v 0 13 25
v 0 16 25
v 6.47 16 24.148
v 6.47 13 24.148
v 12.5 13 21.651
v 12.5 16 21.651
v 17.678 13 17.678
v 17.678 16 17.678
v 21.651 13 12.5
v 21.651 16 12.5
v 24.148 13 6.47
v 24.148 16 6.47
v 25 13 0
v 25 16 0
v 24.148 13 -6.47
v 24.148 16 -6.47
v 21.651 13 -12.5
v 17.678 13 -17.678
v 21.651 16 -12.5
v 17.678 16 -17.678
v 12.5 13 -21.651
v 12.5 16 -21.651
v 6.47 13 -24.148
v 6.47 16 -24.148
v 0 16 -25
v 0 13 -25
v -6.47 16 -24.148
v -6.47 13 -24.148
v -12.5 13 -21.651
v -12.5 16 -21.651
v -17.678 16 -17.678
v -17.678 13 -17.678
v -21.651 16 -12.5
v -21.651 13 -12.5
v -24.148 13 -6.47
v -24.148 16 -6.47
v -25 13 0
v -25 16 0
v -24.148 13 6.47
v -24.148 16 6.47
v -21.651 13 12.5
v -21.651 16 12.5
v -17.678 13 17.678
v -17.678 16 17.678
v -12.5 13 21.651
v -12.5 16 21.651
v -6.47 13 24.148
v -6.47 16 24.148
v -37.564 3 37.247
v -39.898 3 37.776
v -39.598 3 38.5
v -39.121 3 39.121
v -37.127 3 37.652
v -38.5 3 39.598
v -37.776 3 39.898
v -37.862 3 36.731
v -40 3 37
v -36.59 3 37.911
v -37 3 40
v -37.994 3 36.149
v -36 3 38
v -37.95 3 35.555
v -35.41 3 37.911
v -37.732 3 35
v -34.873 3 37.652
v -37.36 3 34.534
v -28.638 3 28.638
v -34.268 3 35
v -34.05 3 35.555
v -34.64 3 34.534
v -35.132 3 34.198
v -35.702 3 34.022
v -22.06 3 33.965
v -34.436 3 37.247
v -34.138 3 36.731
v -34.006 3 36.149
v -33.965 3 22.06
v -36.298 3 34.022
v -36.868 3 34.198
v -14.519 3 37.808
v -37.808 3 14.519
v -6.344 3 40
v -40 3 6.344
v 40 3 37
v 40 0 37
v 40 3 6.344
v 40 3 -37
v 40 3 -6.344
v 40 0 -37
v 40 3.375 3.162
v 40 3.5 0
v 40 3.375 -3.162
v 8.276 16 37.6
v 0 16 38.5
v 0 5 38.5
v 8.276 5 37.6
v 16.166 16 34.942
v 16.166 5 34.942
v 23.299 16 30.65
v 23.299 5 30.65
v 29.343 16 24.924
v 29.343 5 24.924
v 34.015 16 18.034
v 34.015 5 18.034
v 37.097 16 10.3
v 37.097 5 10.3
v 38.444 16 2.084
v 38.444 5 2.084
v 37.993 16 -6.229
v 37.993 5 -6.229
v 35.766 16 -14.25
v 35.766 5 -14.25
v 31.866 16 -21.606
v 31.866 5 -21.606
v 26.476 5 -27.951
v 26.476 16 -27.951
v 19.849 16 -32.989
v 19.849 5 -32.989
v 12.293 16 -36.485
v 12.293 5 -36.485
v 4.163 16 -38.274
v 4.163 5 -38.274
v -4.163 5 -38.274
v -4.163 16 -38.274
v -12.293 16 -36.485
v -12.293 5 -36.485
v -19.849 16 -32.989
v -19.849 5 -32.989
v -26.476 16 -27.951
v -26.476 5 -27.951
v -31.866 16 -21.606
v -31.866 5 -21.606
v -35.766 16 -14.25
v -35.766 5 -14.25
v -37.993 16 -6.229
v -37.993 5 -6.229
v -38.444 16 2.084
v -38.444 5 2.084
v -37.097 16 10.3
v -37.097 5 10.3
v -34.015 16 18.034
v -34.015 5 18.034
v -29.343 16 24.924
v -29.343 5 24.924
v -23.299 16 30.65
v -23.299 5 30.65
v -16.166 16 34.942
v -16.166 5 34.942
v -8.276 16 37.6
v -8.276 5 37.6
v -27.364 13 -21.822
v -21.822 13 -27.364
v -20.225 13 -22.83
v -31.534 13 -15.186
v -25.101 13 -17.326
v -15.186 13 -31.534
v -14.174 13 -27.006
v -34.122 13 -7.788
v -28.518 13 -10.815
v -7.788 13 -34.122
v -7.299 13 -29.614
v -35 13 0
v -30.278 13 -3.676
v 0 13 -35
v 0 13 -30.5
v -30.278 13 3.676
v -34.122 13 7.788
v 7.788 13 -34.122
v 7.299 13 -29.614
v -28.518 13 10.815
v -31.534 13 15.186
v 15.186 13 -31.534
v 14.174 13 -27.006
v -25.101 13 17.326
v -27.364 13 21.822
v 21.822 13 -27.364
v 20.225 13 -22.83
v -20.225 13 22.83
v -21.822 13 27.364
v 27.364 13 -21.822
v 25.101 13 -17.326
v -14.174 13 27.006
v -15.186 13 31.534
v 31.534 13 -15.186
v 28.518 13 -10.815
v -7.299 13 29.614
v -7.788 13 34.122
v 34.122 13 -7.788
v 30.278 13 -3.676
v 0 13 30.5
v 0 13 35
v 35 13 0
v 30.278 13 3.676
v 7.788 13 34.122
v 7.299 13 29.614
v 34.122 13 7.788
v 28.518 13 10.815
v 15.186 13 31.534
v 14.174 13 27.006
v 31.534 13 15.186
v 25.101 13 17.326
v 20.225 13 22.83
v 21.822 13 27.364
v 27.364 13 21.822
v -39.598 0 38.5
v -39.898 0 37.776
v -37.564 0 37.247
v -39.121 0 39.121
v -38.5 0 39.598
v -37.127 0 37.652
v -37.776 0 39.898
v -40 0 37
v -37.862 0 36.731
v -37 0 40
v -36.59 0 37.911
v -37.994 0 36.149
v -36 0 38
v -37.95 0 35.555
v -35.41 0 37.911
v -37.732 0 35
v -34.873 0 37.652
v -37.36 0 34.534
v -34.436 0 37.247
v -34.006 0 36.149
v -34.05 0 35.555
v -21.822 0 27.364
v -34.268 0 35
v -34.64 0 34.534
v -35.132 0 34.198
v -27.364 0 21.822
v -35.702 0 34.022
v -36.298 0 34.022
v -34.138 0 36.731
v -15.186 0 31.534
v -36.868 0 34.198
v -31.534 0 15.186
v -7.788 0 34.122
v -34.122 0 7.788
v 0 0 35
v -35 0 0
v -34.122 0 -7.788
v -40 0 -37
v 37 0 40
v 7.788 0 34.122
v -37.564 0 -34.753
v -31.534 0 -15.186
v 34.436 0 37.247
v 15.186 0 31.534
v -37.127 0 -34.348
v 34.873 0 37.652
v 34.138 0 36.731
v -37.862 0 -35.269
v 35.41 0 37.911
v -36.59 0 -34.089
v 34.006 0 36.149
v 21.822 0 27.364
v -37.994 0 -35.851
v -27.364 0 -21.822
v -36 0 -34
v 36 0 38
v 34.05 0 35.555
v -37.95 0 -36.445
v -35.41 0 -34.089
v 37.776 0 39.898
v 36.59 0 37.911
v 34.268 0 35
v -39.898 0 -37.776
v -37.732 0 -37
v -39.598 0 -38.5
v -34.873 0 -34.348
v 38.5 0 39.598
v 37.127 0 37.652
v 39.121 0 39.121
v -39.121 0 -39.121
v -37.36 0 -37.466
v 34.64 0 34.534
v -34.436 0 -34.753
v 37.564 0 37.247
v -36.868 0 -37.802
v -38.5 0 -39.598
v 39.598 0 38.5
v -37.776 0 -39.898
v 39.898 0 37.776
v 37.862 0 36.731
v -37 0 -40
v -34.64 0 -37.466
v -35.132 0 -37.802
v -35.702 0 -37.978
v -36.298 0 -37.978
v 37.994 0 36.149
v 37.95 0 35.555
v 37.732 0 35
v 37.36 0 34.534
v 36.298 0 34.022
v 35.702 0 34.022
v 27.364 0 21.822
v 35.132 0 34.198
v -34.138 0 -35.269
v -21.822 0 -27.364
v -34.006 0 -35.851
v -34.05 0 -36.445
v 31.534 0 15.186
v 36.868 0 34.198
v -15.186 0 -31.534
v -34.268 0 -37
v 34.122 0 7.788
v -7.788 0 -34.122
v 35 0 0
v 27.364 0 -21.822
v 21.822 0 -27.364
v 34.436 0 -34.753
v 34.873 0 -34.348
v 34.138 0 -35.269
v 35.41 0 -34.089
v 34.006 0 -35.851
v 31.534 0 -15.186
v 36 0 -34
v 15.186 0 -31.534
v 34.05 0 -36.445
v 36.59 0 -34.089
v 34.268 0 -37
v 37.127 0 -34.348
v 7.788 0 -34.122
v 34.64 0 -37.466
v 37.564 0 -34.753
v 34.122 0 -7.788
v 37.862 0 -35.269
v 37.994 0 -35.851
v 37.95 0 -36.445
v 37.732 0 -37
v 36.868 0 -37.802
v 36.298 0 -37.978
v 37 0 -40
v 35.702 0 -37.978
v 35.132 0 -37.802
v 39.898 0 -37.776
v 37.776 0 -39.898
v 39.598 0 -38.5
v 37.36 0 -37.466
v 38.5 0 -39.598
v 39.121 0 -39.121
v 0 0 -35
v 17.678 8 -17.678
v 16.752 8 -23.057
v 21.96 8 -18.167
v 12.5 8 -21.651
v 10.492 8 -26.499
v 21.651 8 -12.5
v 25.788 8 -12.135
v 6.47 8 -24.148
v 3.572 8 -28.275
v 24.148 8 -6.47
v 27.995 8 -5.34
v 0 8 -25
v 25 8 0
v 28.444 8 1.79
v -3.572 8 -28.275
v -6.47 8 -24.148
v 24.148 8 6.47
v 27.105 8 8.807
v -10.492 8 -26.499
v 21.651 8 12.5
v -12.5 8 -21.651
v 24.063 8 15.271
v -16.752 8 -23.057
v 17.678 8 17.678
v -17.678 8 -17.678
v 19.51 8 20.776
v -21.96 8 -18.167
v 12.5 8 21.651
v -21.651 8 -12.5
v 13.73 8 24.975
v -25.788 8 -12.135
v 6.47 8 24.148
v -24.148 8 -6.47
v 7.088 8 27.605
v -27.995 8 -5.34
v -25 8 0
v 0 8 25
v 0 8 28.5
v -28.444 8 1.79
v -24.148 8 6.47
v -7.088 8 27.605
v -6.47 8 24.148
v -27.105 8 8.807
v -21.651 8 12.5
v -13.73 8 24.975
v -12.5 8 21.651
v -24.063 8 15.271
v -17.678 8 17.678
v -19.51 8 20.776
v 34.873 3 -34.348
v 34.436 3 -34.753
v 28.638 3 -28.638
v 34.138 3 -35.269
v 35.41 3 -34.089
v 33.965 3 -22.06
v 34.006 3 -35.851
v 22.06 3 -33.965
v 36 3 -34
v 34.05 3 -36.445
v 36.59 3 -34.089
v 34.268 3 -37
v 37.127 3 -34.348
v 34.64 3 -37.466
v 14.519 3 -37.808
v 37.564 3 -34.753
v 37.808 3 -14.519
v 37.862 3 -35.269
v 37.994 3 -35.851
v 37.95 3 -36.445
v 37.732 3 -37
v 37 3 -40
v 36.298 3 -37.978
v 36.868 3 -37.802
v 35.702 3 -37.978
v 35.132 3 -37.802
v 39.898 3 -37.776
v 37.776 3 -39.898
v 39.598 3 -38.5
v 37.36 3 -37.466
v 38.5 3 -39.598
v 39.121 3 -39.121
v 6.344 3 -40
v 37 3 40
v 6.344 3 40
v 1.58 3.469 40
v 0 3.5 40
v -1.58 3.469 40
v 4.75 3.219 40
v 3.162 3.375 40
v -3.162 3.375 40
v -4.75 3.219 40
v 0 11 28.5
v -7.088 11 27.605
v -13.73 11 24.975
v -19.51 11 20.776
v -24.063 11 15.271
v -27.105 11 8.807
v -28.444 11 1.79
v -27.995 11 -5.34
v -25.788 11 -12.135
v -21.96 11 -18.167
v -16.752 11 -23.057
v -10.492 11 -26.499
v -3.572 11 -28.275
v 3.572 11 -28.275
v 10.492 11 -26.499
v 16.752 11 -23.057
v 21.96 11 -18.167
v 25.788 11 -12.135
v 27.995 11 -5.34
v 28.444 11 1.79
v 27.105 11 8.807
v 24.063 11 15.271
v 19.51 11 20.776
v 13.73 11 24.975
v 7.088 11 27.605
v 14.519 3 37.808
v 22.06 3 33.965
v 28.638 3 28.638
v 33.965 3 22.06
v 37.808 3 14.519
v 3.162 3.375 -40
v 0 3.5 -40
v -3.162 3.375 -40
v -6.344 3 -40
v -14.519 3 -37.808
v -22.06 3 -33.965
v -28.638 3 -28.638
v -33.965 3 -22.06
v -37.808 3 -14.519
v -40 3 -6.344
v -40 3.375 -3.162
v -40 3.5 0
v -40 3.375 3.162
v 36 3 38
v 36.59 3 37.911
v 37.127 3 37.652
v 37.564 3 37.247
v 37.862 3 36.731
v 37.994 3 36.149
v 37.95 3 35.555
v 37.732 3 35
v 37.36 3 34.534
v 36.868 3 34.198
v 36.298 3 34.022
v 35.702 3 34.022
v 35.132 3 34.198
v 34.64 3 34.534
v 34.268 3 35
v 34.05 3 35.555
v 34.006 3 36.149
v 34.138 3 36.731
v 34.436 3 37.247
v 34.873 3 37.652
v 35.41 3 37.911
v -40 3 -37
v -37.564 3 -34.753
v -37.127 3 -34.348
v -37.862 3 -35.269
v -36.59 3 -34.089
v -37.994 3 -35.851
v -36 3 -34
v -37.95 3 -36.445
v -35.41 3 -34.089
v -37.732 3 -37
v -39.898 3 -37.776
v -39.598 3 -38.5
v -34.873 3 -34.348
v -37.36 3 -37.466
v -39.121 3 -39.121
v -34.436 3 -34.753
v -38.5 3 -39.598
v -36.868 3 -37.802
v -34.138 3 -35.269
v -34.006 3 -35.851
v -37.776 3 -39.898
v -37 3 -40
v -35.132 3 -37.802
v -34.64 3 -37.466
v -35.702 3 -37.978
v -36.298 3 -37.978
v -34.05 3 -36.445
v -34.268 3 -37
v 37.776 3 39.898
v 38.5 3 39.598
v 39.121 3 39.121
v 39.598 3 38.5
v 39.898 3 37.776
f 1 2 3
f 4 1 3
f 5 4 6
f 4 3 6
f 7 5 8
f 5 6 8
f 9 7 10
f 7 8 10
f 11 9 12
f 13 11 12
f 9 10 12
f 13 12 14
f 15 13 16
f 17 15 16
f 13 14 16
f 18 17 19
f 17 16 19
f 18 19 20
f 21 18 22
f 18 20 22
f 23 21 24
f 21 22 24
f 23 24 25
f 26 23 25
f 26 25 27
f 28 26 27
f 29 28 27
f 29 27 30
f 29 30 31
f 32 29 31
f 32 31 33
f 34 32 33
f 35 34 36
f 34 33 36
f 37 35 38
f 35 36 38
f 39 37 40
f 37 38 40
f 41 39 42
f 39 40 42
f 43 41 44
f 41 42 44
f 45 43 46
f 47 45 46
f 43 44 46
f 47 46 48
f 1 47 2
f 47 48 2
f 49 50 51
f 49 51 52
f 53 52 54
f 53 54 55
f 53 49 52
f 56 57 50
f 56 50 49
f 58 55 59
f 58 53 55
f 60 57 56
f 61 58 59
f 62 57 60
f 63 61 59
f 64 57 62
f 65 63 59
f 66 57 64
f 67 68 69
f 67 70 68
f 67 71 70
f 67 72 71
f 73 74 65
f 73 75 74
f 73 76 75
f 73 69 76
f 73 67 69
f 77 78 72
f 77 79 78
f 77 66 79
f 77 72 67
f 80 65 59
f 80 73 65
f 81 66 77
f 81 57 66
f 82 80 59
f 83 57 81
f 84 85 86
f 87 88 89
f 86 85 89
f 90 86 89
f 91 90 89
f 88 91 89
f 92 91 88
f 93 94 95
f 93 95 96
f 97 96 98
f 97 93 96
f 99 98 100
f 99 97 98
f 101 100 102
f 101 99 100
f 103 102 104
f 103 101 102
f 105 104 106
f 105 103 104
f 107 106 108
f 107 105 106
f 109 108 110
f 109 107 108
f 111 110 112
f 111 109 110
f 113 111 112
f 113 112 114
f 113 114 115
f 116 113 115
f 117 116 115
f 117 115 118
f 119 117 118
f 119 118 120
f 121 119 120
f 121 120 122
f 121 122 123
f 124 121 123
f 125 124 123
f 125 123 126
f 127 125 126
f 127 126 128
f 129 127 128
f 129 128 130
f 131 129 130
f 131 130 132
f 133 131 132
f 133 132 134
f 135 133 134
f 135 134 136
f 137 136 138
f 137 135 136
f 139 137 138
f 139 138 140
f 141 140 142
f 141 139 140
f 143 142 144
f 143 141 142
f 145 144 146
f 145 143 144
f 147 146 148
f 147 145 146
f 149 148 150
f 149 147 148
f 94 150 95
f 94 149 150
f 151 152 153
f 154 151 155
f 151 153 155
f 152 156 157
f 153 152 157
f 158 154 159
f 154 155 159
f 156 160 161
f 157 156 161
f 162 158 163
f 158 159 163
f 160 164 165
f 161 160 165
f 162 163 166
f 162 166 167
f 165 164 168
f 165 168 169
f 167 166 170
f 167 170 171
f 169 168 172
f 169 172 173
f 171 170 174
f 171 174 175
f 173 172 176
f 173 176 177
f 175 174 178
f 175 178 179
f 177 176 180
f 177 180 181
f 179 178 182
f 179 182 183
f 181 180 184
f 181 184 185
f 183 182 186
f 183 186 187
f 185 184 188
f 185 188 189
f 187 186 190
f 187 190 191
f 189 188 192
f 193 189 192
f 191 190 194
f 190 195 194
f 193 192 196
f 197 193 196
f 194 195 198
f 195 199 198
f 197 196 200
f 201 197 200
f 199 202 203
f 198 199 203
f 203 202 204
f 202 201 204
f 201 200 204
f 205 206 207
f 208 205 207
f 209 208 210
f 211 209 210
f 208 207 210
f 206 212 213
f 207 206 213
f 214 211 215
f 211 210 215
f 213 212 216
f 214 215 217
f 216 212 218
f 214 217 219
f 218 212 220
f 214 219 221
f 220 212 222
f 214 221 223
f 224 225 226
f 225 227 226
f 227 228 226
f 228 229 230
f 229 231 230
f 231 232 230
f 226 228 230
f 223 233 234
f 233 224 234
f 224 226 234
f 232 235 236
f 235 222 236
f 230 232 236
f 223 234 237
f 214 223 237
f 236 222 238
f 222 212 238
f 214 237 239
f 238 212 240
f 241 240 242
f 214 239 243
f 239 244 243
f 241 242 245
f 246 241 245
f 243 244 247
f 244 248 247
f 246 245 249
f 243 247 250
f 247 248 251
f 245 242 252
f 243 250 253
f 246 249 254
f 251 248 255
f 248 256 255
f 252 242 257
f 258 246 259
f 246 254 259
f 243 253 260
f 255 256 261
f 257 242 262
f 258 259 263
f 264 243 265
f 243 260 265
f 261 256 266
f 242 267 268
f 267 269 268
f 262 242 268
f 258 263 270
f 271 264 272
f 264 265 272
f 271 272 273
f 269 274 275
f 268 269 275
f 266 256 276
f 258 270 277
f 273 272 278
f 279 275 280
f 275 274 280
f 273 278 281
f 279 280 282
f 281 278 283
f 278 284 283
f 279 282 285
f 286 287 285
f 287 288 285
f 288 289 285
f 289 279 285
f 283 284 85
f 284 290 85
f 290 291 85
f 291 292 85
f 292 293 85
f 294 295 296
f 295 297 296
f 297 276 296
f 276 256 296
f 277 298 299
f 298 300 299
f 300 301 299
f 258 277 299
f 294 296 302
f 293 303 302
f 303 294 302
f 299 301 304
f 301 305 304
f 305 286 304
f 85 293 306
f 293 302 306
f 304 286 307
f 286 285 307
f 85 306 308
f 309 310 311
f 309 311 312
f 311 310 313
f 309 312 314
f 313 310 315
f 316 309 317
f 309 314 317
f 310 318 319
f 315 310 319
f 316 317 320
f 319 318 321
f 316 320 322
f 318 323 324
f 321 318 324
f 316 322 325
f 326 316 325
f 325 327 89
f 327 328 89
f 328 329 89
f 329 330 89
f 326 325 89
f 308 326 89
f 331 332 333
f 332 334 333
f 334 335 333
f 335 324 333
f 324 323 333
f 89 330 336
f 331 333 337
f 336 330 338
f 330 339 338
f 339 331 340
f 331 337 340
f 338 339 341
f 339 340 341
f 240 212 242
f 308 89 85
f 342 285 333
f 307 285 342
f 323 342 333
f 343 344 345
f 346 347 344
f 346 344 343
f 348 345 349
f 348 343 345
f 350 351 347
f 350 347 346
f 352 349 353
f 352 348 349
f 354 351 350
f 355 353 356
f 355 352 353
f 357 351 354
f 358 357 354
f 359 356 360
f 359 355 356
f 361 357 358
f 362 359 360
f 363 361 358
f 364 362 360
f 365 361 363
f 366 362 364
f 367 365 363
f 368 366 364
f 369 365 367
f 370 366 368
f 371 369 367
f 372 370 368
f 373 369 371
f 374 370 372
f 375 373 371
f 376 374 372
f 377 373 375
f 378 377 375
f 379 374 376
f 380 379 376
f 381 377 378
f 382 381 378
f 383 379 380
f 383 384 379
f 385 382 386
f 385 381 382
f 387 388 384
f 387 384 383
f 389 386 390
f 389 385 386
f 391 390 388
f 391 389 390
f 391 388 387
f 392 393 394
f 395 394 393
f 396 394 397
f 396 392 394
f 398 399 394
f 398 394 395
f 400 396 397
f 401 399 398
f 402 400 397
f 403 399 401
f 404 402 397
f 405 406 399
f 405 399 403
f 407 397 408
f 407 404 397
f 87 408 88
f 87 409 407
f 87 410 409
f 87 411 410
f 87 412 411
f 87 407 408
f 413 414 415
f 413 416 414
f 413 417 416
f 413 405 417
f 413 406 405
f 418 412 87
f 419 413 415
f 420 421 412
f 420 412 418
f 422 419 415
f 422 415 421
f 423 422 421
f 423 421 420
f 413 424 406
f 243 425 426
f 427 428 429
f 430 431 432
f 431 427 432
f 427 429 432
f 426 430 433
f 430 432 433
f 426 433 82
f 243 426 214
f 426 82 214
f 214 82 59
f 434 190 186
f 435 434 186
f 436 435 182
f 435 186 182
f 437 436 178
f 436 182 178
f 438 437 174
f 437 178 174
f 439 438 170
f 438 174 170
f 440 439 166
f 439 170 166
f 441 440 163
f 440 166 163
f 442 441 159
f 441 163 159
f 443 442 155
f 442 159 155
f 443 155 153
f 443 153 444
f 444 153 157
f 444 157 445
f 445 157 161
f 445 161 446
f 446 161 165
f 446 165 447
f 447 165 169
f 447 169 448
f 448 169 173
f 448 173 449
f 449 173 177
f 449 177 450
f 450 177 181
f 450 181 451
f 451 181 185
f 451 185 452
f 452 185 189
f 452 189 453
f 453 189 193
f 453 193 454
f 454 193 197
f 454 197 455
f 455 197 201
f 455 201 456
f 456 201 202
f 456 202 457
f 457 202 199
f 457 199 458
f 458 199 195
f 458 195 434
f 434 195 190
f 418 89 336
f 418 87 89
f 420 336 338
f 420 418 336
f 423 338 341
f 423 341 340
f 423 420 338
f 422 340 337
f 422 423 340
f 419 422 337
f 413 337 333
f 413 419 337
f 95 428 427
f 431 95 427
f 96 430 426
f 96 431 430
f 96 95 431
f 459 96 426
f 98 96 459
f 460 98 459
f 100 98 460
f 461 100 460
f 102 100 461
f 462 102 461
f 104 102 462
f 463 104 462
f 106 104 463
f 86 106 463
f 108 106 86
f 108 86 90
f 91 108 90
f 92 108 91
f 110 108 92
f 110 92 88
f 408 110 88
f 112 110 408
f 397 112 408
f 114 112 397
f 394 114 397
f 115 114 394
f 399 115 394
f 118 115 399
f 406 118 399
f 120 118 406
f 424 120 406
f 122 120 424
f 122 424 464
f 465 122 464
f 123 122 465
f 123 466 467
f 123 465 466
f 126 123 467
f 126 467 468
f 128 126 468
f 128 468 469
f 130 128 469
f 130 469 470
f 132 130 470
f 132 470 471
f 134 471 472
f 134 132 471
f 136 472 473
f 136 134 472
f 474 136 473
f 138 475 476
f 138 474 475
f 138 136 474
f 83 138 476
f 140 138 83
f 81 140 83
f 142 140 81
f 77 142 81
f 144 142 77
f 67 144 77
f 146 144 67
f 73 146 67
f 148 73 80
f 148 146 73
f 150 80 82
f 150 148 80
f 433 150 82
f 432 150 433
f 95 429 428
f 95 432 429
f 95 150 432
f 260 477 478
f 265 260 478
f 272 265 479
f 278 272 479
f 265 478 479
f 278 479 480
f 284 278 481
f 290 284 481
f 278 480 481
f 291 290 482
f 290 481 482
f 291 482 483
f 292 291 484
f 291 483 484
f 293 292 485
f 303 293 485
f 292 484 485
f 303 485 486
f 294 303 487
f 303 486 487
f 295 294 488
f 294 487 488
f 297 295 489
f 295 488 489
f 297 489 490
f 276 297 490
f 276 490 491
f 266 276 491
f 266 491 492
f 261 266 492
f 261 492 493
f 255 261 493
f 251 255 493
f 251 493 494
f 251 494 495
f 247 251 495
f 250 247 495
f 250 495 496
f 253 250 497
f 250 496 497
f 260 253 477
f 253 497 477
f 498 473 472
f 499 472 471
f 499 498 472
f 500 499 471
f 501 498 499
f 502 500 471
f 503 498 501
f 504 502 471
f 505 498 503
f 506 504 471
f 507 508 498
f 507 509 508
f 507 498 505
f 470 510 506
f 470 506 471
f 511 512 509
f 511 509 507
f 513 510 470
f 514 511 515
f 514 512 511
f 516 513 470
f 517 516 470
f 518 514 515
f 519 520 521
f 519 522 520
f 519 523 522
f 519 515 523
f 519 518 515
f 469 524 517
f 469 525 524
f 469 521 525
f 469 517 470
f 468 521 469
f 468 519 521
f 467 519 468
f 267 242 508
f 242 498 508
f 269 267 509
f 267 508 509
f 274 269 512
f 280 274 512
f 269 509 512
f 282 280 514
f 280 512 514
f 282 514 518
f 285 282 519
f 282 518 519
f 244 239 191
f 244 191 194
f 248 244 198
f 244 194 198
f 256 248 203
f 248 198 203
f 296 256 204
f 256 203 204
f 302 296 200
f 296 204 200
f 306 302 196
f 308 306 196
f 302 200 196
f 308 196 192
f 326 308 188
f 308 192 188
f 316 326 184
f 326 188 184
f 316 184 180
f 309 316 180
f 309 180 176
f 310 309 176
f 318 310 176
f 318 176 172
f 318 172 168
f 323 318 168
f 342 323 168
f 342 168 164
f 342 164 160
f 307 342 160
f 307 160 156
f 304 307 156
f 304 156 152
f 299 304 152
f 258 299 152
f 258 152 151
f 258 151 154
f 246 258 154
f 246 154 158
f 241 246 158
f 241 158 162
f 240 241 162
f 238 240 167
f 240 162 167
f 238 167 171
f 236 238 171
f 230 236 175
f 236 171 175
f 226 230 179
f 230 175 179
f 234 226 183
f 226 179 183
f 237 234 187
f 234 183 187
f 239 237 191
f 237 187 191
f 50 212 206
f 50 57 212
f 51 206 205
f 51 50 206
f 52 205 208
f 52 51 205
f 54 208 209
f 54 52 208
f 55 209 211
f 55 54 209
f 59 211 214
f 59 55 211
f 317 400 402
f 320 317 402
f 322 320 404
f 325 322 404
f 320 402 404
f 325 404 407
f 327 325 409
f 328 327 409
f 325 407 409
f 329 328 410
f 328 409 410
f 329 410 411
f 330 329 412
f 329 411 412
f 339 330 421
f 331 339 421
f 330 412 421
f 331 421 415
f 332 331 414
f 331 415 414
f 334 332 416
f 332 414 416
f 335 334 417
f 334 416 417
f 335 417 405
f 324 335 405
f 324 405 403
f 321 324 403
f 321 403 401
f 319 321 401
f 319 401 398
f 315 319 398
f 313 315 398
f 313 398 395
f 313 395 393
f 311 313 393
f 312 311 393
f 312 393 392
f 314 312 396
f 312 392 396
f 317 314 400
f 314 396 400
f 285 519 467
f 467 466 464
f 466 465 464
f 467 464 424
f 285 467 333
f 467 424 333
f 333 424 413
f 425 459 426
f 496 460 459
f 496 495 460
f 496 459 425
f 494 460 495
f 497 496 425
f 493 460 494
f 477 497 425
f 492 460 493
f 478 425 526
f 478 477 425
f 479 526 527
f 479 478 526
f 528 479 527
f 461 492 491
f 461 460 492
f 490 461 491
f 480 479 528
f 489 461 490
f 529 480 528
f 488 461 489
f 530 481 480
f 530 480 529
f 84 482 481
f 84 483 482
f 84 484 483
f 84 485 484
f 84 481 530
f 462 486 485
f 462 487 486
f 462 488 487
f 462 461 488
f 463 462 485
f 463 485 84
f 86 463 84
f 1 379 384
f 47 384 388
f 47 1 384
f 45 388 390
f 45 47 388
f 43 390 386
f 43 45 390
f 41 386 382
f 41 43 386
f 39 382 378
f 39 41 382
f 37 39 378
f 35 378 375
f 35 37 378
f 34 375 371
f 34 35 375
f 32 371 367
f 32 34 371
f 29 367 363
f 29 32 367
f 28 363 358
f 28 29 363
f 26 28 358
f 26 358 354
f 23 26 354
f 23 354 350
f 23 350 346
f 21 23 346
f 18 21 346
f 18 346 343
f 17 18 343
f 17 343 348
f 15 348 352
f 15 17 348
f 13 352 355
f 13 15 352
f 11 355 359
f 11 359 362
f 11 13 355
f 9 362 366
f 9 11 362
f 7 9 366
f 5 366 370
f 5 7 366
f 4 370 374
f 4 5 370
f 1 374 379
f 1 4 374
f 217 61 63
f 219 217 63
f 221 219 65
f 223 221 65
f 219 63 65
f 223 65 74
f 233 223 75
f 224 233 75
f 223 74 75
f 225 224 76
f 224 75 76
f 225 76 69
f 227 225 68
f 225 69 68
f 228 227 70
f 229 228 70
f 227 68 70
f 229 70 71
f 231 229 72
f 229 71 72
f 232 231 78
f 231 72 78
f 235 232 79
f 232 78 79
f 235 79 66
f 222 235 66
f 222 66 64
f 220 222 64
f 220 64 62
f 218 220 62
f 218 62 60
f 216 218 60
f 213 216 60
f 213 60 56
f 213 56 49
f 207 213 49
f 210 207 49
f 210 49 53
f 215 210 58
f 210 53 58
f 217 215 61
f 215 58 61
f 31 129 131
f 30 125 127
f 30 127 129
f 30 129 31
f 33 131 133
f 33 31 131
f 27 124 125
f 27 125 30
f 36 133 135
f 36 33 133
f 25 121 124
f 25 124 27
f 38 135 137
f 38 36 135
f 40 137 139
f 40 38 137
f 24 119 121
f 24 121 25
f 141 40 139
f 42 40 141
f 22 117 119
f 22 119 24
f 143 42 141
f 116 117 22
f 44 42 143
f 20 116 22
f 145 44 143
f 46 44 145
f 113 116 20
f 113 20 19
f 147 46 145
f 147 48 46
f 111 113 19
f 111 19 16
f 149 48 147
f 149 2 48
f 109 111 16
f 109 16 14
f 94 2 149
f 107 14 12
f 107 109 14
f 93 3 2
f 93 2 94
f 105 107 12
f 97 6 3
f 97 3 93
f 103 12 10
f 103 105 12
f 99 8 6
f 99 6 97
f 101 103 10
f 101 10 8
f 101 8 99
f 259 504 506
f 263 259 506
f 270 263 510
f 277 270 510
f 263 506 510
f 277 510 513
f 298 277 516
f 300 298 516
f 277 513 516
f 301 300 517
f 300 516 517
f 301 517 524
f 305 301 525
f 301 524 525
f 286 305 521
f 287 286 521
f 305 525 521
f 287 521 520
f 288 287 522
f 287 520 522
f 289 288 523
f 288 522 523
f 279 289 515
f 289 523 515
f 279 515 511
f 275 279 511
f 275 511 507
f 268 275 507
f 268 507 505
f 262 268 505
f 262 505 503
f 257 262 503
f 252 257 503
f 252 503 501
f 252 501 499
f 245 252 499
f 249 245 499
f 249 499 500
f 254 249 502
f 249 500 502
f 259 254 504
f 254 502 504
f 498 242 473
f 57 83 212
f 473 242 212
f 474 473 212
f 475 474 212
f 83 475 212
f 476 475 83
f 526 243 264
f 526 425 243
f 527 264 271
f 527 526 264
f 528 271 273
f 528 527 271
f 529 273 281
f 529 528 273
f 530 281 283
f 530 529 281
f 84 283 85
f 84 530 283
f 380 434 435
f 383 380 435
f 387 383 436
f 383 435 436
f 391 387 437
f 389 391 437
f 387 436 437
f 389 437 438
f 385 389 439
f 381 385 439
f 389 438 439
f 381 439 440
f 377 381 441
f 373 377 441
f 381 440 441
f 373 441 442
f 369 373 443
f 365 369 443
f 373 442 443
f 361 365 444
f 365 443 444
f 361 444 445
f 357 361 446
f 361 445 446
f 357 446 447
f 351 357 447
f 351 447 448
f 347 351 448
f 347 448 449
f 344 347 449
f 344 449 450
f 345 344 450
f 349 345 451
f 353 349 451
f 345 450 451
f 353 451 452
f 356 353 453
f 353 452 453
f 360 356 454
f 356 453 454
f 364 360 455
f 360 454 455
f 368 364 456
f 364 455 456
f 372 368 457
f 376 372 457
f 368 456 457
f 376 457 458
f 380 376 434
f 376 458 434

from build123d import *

# Parameters (mm, degrees)
SKETCH1_W           = 80
SKETCH1_H           = 80
BOSS_EXTRUDE1_DEPTH = 3
FILLET1_R           = 3
SKETCH2_R           = 2
CUT_EXTRUDE1_DEPTH  = 3
SKETCH3_R           = 35
CUT_EXTRUDE2_DEPTH  = 3
BOSS_EXTRUDE2_START = 10
SKETCH4_R           = 38.5
SKETCH4_R_2         = 35
BOSS_EXTRUDE2_DEPTH = 10
BOSS_EXTRUDE3_START = 3
SKETCH5_R           = 38.5
BOSS_EXTRUDE3_DEPTH = 3
SKETCH6_R           = 25
CUT_EXTRUDE3_DEPTH  = 3
SKETCH7_R           = 28.5
SKETCH7_R_2         = 25
BOSS_EXTRUDE4_DEPTH = 5
CHAMFER1_SIZE       = 2
CHAMFER2_SIZE       = 2


with BuildPart() as part:
    # Sketch1 → Boss-Extrude1 (new body)
    with BuildSketch(Plane(origin=(0, 0, 0), x_dir=(1, 0, 0), z_dir=(0, 1, 0))):
        Rectangle(SKETCH1_W, SKETCH1_H)
    extrude(amount=BOSS_EXTRUDE1_DEPTH)

    # Fillet1
    fillet1_edges = [part.edges().sort_by_distance(p)[0] for p in [
        (40, 1.5, 40),
        (-40, 1.5, 40),
        (-40, 1.5, -40),
        (40, 1.5, -40),
    ]]
    fillet(fillet1_edges, radius=FILLET1_R)

    # Sketch2 → Cut-Extrude1 (cut)
    with BuildSketch(Plane(origin=(0, 3, 0), x_dir=(1, 0, 0), z_dir=(0, 1, 0))):
        with Locations(Location((-36, 36, 0), (0, 0, 270))):
            Circle(SKETCH2_R)
        with Locations(Location((36, 36, 0), (0, 0, 270))):
            Circle(SKETCH2_R)
        with Locations(Location((-36, -36, 0), (0, 0, 270))):
            Circle(SKETCH2_R)
        with Locations(Location((36, -36, 0), (0, 0, 270))):
            Circle(SKETCH2_R)
    extrude(amount=-CUT_EXTRUDE1_DEPTH, mode=Mode.SUBTRACT)

    # Sketch3 → Cut-Extrude2 (cut)
    with BuildSketch(Plane(origin=(0, 3, 0), x_dir=(1, 0, 0), z_dir=(0, 1, 0))):
        with Locations(Location((0, 0, 0), (0, 0, 270))):
            Circle(SKETCH3_R)
    extrude(amount=-CUT_EXTRUDE2_DEPTH, mode=Mode.SUBTRACT)

    # Sketch4 → Boss-Extrude2 (add)
    with BuildSketch(Plane(origin=(0, 3, 0), x_dir=(1, 0, 0), z_dir=(0, 1, 0)).offset(BOSS_EXTRUDE2_START)):
        with Locations(Location((0, 0, 0), (0, 0, 270))):
            Circle(SKETCH4_R)
        with Locations(Location((0, 0, 0), (0, 0, 270))):
            Circle(SKETCH4_R_2, mode=Mode.SUBTRACT)
    extrude(amount=-BOSS_EXTRUDE2_DEPTH)

    # Sketch5 → Boss-Extrude3 (add)
    with BuildSketch(Plane(origin=(0, 13, 0), x_dir=(1, 0, 0), z_dir=(0, 1, 0)).offset(BOSS_EXTRUDE3_START)):
        with Locations(Location((0, 0, 0), (0, 0, 270))):
            Circle(SKETCH5_R)
    extrude(amount=-BOSS_EXTRUDE3_DEPTH)

    # Sketch6 → Cut-Extrude3 (cut)
    with BuildSketch(Plane(origin=(0, 16, 0), x_dir=(1, 0, 0), z_dir=(0, 1, 0))):
        with Locations(Location((0, 0, 0), (0, 0, 270))):
            Circle(SKETCH6_R)
    extrude(amount=-CUT_EXTRUDE3_DEPTH, mode=Mode.SUBTRACT)

    # Sketch7 → Boss-Extrude4 (add)
    with BuildSketch(Plane.XZ.offset(-13)):
        with Locations(Location((0, 0, 0), (0, 0, 90))):
            Circle(SKETCH7_R)
        with Locations(Location((0, 0, 0), (0, 0, 90))):
            Circle(SKETCH7_R_2, mode=Mode.SUBTRACT)
    extrude(amount=BOSS_EXTRUDE4_DEPTH)

    # Chamfer1
    chamfer1_edges = [part.edges().sort_by_distance(p)[0] for p in [
        (0, 13, -28.5),
    ]]
    chamfer(chamfer1_edges, length=CHAMFER1_SIZE)

    # Chamfer2
    # the kernel refuses this chamfer: 2 mm, written as the material it adds along each edge
    with BuildSketch(Plane(origin=(0, 3, 0), x_dir=(0, 0, 1), z_dir=(-1, 0, 0))) as chamfer2_piece_1_section:
        Polygon((38.5 + CHAMFER2_SIZE, 0), (38.5, CHAMFER2_SIZE), (38.5, 0), align=None)
    chamfer2_piece_1 = revolve(axis=Axis((0, 3, 0), (0, 1, 0)), mode=Mode.PRIVATE)
    chamfer2_piece_1 = split(chamfer2_piece_1, bisect_by=Plane(origin=(0, 3.942538478, -40), z_dir=(0, 0, 1)), keep=Keep.TOP, mode=Mode.PRIVATE)
    chamfer2_piece_1 = split(chamfer2_piece_1, bisect_by=Plane(origin=(-40, 3.942538478, -39.442538478), z_dir=(1, 0, 0)), keep=Keep.TOP, mode=Mode.PRIVATE)
    chamfer2_piece_1 = split(chamfer2_piece_1, bisect_by=Plane(origin=(40, 3.942538478, -39.442538478), z_dir=(-1, 0, 0)), keep=Keep.TOP, mode=Mode.PRIVATE)
    chamfer2_piece_1 = split(chamfer2_piece_1, bisect_by=Plane(origin=(0, 3.942538478, 40), z_dir=(0, 0, -1)), keep=Keep.TOP, mode=Mode.PRIVATE)
    add(chamfer2_piece_1)


solid = part.part
